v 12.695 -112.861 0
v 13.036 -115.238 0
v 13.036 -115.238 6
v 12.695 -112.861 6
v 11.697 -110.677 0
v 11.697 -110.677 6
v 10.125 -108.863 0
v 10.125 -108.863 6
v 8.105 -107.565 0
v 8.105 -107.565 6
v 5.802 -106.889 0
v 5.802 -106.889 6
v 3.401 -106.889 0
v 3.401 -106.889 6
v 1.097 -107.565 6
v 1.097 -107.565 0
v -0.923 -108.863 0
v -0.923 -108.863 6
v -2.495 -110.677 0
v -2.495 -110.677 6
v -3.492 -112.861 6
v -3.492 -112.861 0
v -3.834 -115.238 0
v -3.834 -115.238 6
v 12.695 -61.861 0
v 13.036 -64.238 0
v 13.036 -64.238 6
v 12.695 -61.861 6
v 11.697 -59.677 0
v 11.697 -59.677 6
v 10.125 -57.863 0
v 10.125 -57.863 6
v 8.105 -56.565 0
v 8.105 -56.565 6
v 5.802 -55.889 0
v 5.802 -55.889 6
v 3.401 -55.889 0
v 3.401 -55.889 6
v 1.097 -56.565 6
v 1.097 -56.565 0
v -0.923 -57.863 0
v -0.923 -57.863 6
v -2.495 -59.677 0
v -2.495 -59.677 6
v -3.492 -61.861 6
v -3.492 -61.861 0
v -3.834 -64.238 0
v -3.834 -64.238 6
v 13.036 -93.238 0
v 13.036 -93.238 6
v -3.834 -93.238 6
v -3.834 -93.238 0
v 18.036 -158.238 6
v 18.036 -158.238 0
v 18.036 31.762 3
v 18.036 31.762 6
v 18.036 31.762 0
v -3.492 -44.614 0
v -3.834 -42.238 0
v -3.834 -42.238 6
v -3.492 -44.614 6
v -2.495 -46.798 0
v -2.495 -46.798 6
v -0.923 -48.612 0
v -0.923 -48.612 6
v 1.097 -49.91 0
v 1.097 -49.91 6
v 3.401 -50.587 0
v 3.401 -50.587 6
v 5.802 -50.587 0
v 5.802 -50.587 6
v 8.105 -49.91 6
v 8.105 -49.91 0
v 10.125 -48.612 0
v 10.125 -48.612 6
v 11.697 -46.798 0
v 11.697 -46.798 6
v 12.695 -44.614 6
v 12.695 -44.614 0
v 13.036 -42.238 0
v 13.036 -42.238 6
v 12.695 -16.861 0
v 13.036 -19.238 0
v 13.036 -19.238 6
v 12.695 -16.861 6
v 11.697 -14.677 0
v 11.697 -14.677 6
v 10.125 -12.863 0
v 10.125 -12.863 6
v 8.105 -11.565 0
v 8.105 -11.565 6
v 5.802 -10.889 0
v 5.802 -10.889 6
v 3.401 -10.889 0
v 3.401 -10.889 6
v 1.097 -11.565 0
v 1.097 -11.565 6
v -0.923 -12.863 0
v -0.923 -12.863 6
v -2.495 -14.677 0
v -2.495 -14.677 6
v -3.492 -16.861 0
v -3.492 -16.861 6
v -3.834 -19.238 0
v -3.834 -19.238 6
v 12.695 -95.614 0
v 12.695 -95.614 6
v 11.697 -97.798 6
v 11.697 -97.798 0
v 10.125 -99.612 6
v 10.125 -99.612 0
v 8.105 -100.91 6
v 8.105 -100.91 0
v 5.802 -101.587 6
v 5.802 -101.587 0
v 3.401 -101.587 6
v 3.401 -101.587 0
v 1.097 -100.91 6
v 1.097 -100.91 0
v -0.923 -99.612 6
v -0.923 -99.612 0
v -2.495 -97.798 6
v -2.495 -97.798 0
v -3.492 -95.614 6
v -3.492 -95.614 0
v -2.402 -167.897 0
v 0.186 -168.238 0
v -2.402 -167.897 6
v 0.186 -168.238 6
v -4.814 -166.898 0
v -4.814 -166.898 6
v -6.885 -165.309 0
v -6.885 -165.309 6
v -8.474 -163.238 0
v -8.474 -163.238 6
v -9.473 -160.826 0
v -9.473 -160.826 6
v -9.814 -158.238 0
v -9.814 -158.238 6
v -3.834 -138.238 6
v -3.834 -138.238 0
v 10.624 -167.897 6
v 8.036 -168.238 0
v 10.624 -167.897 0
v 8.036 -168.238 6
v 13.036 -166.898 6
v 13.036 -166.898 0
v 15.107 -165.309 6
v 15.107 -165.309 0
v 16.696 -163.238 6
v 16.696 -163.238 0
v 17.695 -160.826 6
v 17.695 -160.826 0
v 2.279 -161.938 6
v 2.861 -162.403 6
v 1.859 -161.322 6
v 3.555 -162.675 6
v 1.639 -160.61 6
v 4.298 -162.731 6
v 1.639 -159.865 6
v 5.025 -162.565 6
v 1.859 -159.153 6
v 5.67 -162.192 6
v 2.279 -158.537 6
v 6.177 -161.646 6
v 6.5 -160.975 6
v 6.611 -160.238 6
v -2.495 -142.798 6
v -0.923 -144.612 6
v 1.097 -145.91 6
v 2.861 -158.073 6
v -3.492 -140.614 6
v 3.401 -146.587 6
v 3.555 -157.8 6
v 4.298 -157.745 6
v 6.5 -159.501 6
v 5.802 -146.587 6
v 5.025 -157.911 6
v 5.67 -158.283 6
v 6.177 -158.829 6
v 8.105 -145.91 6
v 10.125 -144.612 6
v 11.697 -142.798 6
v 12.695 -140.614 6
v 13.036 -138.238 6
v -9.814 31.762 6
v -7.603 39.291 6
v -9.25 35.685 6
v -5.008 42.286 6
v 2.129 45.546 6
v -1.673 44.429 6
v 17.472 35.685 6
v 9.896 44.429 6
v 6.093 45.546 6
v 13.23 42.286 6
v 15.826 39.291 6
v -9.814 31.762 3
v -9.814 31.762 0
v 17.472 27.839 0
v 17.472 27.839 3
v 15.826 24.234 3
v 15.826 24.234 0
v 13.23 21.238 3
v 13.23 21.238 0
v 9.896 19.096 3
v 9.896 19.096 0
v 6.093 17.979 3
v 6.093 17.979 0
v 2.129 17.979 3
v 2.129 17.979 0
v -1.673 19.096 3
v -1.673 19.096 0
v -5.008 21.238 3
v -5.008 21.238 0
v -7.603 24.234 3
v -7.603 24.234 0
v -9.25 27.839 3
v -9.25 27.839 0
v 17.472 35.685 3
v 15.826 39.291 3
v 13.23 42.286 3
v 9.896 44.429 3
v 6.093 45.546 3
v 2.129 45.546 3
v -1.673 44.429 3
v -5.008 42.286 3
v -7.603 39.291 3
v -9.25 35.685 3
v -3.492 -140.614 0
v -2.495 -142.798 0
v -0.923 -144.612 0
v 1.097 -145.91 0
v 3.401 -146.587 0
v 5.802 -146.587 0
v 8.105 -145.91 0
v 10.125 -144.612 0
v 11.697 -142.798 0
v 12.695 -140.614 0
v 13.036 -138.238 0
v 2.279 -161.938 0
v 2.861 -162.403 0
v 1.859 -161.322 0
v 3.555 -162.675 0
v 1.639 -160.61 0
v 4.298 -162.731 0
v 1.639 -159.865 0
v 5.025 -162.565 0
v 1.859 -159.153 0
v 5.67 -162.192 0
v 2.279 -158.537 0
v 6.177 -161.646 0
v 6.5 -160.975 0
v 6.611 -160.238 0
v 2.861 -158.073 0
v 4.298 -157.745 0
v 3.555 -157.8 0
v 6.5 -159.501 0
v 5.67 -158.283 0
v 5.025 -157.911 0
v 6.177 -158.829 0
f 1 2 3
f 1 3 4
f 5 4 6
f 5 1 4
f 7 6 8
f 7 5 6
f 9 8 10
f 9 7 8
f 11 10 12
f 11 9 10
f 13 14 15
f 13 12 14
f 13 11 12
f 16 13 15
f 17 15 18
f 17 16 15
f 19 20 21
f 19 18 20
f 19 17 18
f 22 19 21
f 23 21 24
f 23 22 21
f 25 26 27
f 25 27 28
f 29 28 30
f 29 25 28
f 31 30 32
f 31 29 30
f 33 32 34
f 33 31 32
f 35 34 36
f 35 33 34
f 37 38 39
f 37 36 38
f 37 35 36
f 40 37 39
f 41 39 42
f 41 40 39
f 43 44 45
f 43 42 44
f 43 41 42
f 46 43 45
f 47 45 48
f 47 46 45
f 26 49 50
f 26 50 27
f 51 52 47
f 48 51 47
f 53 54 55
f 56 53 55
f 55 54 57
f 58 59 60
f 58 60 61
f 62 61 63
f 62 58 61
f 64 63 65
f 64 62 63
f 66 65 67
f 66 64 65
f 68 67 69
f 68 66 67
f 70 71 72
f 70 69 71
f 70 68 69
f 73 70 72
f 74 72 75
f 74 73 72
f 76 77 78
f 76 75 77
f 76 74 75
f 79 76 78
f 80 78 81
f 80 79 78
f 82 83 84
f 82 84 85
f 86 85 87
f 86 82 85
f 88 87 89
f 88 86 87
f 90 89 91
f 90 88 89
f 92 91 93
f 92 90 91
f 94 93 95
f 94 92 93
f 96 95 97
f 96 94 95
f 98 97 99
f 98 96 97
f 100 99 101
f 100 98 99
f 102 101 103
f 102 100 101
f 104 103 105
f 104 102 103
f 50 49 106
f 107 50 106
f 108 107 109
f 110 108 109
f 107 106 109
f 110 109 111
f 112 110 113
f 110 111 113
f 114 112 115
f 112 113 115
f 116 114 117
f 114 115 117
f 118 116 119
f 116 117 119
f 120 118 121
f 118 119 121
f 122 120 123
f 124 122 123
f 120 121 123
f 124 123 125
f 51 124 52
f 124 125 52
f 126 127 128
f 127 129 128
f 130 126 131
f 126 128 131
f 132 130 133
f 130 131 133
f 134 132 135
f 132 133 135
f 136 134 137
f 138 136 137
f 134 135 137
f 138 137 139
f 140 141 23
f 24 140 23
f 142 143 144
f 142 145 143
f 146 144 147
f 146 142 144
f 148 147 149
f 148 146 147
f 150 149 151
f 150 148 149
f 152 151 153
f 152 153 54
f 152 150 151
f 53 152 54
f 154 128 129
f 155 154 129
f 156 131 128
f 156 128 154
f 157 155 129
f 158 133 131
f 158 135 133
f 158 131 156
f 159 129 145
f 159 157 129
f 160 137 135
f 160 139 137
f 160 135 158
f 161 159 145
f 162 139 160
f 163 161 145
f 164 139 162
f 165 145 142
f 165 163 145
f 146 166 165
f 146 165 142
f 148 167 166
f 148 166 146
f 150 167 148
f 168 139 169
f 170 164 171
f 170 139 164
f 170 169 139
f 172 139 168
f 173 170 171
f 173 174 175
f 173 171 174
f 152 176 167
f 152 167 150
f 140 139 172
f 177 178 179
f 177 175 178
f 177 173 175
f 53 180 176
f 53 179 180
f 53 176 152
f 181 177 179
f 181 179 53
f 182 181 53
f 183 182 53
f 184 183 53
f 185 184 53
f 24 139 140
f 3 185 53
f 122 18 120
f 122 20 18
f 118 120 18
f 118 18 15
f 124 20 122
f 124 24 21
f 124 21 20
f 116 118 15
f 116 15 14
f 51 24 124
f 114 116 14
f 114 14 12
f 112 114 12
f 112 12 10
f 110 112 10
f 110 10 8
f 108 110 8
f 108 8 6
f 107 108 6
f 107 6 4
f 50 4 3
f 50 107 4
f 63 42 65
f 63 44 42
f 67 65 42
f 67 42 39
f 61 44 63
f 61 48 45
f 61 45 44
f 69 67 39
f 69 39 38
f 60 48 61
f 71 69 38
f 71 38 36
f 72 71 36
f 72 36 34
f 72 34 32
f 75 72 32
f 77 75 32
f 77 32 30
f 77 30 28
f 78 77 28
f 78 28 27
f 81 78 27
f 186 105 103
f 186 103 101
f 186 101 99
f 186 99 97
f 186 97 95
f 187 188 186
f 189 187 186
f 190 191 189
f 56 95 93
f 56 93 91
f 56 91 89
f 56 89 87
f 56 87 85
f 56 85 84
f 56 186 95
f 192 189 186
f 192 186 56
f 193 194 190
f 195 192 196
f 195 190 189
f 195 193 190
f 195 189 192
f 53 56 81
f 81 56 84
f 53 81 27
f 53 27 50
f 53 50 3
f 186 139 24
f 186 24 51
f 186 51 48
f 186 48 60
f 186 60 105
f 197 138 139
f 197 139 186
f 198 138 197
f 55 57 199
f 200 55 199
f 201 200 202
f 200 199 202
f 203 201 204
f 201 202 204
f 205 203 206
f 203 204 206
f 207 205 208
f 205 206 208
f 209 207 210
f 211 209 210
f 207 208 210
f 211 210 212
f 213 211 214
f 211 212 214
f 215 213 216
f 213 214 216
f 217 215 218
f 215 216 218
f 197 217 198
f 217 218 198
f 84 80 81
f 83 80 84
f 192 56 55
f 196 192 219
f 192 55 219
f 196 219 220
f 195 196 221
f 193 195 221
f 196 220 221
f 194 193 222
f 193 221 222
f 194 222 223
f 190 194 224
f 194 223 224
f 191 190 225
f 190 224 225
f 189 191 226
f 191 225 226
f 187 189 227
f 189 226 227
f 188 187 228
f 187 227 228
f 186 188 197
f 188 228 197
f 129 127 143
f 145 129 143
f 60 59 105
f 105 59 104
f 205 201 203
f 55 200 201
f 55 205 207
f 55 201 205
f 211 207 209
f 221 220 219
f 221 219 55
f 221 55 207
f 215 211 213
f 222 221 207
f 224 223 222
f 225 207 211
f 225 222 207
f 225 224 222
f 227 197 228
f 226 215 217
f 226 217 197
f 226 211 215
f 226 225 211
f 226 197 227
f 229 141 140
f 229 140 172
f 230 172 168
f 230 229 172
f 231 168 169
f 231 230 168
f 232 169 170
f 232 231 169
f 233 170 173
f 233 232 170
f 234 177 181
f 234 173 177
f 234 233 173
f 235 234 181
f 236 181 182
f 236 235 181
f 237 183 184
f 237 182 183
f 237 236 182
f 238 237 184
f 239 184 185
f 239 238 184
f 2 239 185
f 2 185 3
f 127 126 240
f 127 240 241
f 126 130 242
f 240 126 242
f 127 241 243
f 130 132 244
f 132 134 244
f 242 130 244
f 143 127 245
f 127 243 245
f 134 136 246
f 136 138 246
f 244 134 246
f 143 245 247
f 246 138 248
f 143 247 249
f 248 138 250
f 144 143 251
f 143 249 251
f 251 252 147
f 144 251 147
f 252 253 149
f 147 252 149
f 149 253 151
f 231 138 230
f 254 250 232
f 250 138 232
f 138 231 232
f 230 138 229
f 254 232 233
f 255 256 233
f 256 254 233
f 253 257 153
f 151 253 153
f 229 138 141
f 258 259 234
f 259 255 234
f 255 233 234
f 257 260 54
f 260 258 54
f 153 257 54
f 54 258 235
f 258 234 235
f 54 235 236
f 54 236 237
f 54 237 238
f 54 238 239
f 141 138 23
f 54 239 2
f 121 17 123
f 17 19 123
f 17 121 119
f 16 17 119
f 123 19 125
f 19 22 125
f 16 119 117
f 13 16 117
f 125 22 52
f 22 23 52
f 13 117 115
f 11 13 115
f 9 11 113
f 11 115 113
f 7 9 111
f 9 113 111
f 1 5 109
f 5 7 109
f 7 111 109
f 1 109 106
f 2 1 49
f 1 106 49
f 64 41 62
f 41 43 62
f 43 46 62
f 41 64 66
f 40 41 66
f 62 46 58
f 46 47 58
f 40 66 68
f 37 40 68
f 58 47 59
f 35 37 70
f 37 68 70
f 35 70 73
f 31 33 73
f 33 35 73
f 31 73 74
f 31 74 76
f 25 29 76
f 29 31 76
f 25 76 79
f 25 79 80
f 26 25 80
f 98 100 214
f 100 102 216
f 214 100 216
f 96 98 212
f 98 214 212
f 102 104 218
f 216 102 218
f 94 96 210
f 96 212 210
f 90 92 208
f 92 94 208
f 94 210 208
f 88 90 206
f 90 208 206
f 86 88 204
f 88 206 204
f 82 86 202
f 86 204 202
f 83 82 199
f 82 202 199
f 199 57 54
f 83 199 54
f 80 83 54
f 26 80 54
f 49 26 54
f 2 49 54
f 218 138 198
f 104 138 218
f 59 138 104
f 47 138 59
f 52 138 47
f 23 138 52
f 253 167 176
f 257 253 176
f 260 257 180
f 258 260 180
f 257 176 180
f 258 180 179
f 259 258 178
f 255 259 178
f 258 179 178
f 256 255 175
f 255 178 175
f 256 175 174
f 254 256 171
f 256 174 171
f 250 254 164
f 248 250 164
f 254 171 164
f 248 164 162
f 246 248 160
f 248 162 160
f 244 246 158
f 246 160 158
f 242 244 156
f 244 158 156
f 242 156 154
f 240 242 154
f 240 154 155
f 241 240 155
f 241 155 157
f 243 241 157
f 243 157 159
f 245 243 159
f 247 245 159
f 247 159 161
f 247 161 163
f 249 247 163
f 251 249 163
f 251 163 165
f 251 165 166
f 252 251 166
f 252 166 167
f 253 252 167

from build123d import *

# Parameters (mm, degrees)
ESQUISSE1_W             = 27.85
ESQUISSE1_H             = 200
BOSS_EXTRU_1_DEPTH      = 6
ESQUISSE4_R             = 2.5
ENL_V_MAT_EXTRU_3_DEPTH = 29
ESQUISSE5_R             = 13.925
ENL_V_MAT_EXTRU_4_DEPTH = 3
ESQUISSE7_W             = 16.87
ESQUISSE7_H             = 23
ESQUISSE7_H_2           = 29
ENL_V_MAT_EXTRU_6_DEPTH = 13
CONG_1_R                = 10
CONG_2_R                = 10


with BuildPart() as part:
    # Esquisse1 → Boss.-Extru.1 (new body)
    with BuildSketch(Plane.XY):
        with Locations((4.111190476, -68.237738095)):
            Rectangle(ESQUISSE1_W, ESQUISSE1_H)
        with BuildLine():
            Line((-9.813809524, 31.762261905), (18.036190476, 31.762261905))
            ThreePointArc((18.036190476, 31.762261905), (4.111190476, 45.687261905), (-9.813809524, 31.762261905))
        make_face()
    extrude(amount=BOSS_EXTRU_1_DEPTH)

    # Esquisse4 → Enlèv. mat.-Extru.3 (cut)
    with BuildSketch(Plane.XY.offset(6)):
        with Locations((4.111190476, -160.237738095)):
            Circle(ESQUISSE4_R)
    extrude(amount=-ENL_V_MAT_EXTRU_3_DEPTH, mode=Mode.SUBTRACT)

    # Esquisse5 → Enlèv. mat.-Extru.4 (cut)
    with BuildSketch(Plane(origin=(0, 0, 0), x_dir=(-1, 0, 0), z_dir=(0, 0, -1))):
        with Locations((-4.111190476, 31.762261905)):
            Circle(ESQUISSE5_R)
    extrude(amount=-ENL_V_MAT_EXTRU_4_DEPTH, mode=Mode.SUBTRACT)

    # Esquisse7 → Enlèv. mat.-Extru.6 (cut)
    with BuildSketch(Plane(origin=(0, 0, 0), x_dir=(-1, 0, 0), z_dir=(0, 0, -1))):
        with BuildLine():
            ThreePointArc((-13.036190476, -115.237738095), (-4.601190476, -106.802738095), (3.833809524, -115.237738095))
            Line((3.833809524, -115.237738095), (-13.036190476, -115.237738095))
        make_face()
        with Locations((-4.601190476, -126.737738095)):
            Rectangle(ESQUISSE7_W, ESQUISSE7_H)
        with BuildLine():
            Line((-13.036190476, -138.237738095), (3.833809524, -138.237738095))
            ThreePointArc((3.833809524, -138.237738095), (-4.601190476, -146.672738095), (-13.036190476, -138.237738095))
        make_face()
        with BuildLine():
            Line((3.833809524, -93.237738095), (-13.036190476, -93.237738095))
            ThreePointArc((-13.036190476, -93.237738095), (-4.601190476, -101.672738095), (3.833809524, -93.237738095))
        make_face()
        with Locations((-4.601190476, -78.737738095)):
            Rectangle(ESQUISSE7_W, ESQUISSE7_H_2)
        with BuildLine():
            Line((3.833809524, -64.237738095), (-13.036190476, -64.237738095))
            ThreePointArc((-13.036190476, -64.237738095), (-4.601190476, -55.802738095), (3.833809524, -64.237738095))
        make_face()
        with BuildLine():
            ThreePointArc((3.833809524, -42.237738095), (-4.601190476, -50.672738095), (-13.036190476, -42.237738095))
            Line((-13.036190476, -42.237738095), (3.833809524, -42.237738095))
        make_face()
        with Locations((-4.601190476, -30.737738095)):
            Rectangle(ESQUISSE7_W, ESQUISSE7_H)
        with BuildLine():
            Line((3.833809524, -19.237738095), (-13.036190476, -19.237738095))
            ThreePointArc((-13.036190476, -19.237738095), (-4.601190476, -10.802738095), (3.833809524, -19.237738095))
        make_face()
    extrude(amount=-ENL_V_MAT_EXTRU_6_DEPTH, mode=Mode.SUBTRACT)

    # Congé1
    cong_1_edges = [part.edges().sort_by_distance(p)[0] for p in [
        (18.036190476, -168.237738095, 3),
    ]]
    fillet(cong_1_edges, radius=CONG_1_R)

    # Congé2
    cong_2_edges = [part.edges().sort_by_distance(p)[0] for p in [
        (-9.813809524, -168.237738095, 3),
    ]]
    fillet(cong_2_edges, radius=CONG_2_R)


solid = part.part
